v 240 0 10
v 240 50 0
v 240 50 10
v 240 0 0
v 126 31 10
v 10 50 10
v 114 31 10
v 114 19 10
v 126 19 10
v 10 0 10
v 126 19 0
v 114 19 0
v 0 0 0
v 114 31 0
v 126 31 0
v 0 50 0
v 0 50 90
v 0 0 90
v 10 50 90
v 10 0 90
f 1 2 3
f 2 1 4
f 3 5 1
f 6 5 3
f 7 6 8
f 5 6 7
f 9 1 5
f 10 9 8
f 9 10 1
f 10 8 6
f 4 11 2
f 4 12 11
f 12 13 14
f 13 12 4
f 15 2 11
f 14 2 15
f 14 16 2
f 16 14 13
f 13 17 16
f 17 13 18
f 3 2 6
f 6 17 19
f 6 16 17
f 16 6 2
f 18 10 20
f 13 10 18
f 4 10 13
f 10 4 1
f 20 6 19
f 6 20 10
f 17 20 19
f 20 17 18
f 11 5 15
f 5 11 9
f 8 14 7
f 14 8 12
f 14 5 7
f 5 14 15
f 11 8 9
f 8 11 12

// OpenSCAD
$fn = 32;

// ----------------------------------------------------------------------
// Gantry bracket: 200-250 mm L bracket
// ----------------------------------------------------------------------

// --- parameters (mm) ---
base_l = 240;             // base arm length, X
arm_w = 50;               // arm width, Y
thick = 10;               // arm thickness
up_h = 80;                // vertical arm height, Z
slot_w = 12;              // adjustment slot width in the base

total_h = up_h + thick;  // overall height

difference() {
  union() {
    cube([base_l, arm_w, thick]);
    cube([thick, arm_w, total_h]);
  }
  translate([base_l / 2 - slot_w / 2, arm_w / 2 - slot_w / 2, -1])
    cube([slot_w, slot_w, thick + 2]);
}
